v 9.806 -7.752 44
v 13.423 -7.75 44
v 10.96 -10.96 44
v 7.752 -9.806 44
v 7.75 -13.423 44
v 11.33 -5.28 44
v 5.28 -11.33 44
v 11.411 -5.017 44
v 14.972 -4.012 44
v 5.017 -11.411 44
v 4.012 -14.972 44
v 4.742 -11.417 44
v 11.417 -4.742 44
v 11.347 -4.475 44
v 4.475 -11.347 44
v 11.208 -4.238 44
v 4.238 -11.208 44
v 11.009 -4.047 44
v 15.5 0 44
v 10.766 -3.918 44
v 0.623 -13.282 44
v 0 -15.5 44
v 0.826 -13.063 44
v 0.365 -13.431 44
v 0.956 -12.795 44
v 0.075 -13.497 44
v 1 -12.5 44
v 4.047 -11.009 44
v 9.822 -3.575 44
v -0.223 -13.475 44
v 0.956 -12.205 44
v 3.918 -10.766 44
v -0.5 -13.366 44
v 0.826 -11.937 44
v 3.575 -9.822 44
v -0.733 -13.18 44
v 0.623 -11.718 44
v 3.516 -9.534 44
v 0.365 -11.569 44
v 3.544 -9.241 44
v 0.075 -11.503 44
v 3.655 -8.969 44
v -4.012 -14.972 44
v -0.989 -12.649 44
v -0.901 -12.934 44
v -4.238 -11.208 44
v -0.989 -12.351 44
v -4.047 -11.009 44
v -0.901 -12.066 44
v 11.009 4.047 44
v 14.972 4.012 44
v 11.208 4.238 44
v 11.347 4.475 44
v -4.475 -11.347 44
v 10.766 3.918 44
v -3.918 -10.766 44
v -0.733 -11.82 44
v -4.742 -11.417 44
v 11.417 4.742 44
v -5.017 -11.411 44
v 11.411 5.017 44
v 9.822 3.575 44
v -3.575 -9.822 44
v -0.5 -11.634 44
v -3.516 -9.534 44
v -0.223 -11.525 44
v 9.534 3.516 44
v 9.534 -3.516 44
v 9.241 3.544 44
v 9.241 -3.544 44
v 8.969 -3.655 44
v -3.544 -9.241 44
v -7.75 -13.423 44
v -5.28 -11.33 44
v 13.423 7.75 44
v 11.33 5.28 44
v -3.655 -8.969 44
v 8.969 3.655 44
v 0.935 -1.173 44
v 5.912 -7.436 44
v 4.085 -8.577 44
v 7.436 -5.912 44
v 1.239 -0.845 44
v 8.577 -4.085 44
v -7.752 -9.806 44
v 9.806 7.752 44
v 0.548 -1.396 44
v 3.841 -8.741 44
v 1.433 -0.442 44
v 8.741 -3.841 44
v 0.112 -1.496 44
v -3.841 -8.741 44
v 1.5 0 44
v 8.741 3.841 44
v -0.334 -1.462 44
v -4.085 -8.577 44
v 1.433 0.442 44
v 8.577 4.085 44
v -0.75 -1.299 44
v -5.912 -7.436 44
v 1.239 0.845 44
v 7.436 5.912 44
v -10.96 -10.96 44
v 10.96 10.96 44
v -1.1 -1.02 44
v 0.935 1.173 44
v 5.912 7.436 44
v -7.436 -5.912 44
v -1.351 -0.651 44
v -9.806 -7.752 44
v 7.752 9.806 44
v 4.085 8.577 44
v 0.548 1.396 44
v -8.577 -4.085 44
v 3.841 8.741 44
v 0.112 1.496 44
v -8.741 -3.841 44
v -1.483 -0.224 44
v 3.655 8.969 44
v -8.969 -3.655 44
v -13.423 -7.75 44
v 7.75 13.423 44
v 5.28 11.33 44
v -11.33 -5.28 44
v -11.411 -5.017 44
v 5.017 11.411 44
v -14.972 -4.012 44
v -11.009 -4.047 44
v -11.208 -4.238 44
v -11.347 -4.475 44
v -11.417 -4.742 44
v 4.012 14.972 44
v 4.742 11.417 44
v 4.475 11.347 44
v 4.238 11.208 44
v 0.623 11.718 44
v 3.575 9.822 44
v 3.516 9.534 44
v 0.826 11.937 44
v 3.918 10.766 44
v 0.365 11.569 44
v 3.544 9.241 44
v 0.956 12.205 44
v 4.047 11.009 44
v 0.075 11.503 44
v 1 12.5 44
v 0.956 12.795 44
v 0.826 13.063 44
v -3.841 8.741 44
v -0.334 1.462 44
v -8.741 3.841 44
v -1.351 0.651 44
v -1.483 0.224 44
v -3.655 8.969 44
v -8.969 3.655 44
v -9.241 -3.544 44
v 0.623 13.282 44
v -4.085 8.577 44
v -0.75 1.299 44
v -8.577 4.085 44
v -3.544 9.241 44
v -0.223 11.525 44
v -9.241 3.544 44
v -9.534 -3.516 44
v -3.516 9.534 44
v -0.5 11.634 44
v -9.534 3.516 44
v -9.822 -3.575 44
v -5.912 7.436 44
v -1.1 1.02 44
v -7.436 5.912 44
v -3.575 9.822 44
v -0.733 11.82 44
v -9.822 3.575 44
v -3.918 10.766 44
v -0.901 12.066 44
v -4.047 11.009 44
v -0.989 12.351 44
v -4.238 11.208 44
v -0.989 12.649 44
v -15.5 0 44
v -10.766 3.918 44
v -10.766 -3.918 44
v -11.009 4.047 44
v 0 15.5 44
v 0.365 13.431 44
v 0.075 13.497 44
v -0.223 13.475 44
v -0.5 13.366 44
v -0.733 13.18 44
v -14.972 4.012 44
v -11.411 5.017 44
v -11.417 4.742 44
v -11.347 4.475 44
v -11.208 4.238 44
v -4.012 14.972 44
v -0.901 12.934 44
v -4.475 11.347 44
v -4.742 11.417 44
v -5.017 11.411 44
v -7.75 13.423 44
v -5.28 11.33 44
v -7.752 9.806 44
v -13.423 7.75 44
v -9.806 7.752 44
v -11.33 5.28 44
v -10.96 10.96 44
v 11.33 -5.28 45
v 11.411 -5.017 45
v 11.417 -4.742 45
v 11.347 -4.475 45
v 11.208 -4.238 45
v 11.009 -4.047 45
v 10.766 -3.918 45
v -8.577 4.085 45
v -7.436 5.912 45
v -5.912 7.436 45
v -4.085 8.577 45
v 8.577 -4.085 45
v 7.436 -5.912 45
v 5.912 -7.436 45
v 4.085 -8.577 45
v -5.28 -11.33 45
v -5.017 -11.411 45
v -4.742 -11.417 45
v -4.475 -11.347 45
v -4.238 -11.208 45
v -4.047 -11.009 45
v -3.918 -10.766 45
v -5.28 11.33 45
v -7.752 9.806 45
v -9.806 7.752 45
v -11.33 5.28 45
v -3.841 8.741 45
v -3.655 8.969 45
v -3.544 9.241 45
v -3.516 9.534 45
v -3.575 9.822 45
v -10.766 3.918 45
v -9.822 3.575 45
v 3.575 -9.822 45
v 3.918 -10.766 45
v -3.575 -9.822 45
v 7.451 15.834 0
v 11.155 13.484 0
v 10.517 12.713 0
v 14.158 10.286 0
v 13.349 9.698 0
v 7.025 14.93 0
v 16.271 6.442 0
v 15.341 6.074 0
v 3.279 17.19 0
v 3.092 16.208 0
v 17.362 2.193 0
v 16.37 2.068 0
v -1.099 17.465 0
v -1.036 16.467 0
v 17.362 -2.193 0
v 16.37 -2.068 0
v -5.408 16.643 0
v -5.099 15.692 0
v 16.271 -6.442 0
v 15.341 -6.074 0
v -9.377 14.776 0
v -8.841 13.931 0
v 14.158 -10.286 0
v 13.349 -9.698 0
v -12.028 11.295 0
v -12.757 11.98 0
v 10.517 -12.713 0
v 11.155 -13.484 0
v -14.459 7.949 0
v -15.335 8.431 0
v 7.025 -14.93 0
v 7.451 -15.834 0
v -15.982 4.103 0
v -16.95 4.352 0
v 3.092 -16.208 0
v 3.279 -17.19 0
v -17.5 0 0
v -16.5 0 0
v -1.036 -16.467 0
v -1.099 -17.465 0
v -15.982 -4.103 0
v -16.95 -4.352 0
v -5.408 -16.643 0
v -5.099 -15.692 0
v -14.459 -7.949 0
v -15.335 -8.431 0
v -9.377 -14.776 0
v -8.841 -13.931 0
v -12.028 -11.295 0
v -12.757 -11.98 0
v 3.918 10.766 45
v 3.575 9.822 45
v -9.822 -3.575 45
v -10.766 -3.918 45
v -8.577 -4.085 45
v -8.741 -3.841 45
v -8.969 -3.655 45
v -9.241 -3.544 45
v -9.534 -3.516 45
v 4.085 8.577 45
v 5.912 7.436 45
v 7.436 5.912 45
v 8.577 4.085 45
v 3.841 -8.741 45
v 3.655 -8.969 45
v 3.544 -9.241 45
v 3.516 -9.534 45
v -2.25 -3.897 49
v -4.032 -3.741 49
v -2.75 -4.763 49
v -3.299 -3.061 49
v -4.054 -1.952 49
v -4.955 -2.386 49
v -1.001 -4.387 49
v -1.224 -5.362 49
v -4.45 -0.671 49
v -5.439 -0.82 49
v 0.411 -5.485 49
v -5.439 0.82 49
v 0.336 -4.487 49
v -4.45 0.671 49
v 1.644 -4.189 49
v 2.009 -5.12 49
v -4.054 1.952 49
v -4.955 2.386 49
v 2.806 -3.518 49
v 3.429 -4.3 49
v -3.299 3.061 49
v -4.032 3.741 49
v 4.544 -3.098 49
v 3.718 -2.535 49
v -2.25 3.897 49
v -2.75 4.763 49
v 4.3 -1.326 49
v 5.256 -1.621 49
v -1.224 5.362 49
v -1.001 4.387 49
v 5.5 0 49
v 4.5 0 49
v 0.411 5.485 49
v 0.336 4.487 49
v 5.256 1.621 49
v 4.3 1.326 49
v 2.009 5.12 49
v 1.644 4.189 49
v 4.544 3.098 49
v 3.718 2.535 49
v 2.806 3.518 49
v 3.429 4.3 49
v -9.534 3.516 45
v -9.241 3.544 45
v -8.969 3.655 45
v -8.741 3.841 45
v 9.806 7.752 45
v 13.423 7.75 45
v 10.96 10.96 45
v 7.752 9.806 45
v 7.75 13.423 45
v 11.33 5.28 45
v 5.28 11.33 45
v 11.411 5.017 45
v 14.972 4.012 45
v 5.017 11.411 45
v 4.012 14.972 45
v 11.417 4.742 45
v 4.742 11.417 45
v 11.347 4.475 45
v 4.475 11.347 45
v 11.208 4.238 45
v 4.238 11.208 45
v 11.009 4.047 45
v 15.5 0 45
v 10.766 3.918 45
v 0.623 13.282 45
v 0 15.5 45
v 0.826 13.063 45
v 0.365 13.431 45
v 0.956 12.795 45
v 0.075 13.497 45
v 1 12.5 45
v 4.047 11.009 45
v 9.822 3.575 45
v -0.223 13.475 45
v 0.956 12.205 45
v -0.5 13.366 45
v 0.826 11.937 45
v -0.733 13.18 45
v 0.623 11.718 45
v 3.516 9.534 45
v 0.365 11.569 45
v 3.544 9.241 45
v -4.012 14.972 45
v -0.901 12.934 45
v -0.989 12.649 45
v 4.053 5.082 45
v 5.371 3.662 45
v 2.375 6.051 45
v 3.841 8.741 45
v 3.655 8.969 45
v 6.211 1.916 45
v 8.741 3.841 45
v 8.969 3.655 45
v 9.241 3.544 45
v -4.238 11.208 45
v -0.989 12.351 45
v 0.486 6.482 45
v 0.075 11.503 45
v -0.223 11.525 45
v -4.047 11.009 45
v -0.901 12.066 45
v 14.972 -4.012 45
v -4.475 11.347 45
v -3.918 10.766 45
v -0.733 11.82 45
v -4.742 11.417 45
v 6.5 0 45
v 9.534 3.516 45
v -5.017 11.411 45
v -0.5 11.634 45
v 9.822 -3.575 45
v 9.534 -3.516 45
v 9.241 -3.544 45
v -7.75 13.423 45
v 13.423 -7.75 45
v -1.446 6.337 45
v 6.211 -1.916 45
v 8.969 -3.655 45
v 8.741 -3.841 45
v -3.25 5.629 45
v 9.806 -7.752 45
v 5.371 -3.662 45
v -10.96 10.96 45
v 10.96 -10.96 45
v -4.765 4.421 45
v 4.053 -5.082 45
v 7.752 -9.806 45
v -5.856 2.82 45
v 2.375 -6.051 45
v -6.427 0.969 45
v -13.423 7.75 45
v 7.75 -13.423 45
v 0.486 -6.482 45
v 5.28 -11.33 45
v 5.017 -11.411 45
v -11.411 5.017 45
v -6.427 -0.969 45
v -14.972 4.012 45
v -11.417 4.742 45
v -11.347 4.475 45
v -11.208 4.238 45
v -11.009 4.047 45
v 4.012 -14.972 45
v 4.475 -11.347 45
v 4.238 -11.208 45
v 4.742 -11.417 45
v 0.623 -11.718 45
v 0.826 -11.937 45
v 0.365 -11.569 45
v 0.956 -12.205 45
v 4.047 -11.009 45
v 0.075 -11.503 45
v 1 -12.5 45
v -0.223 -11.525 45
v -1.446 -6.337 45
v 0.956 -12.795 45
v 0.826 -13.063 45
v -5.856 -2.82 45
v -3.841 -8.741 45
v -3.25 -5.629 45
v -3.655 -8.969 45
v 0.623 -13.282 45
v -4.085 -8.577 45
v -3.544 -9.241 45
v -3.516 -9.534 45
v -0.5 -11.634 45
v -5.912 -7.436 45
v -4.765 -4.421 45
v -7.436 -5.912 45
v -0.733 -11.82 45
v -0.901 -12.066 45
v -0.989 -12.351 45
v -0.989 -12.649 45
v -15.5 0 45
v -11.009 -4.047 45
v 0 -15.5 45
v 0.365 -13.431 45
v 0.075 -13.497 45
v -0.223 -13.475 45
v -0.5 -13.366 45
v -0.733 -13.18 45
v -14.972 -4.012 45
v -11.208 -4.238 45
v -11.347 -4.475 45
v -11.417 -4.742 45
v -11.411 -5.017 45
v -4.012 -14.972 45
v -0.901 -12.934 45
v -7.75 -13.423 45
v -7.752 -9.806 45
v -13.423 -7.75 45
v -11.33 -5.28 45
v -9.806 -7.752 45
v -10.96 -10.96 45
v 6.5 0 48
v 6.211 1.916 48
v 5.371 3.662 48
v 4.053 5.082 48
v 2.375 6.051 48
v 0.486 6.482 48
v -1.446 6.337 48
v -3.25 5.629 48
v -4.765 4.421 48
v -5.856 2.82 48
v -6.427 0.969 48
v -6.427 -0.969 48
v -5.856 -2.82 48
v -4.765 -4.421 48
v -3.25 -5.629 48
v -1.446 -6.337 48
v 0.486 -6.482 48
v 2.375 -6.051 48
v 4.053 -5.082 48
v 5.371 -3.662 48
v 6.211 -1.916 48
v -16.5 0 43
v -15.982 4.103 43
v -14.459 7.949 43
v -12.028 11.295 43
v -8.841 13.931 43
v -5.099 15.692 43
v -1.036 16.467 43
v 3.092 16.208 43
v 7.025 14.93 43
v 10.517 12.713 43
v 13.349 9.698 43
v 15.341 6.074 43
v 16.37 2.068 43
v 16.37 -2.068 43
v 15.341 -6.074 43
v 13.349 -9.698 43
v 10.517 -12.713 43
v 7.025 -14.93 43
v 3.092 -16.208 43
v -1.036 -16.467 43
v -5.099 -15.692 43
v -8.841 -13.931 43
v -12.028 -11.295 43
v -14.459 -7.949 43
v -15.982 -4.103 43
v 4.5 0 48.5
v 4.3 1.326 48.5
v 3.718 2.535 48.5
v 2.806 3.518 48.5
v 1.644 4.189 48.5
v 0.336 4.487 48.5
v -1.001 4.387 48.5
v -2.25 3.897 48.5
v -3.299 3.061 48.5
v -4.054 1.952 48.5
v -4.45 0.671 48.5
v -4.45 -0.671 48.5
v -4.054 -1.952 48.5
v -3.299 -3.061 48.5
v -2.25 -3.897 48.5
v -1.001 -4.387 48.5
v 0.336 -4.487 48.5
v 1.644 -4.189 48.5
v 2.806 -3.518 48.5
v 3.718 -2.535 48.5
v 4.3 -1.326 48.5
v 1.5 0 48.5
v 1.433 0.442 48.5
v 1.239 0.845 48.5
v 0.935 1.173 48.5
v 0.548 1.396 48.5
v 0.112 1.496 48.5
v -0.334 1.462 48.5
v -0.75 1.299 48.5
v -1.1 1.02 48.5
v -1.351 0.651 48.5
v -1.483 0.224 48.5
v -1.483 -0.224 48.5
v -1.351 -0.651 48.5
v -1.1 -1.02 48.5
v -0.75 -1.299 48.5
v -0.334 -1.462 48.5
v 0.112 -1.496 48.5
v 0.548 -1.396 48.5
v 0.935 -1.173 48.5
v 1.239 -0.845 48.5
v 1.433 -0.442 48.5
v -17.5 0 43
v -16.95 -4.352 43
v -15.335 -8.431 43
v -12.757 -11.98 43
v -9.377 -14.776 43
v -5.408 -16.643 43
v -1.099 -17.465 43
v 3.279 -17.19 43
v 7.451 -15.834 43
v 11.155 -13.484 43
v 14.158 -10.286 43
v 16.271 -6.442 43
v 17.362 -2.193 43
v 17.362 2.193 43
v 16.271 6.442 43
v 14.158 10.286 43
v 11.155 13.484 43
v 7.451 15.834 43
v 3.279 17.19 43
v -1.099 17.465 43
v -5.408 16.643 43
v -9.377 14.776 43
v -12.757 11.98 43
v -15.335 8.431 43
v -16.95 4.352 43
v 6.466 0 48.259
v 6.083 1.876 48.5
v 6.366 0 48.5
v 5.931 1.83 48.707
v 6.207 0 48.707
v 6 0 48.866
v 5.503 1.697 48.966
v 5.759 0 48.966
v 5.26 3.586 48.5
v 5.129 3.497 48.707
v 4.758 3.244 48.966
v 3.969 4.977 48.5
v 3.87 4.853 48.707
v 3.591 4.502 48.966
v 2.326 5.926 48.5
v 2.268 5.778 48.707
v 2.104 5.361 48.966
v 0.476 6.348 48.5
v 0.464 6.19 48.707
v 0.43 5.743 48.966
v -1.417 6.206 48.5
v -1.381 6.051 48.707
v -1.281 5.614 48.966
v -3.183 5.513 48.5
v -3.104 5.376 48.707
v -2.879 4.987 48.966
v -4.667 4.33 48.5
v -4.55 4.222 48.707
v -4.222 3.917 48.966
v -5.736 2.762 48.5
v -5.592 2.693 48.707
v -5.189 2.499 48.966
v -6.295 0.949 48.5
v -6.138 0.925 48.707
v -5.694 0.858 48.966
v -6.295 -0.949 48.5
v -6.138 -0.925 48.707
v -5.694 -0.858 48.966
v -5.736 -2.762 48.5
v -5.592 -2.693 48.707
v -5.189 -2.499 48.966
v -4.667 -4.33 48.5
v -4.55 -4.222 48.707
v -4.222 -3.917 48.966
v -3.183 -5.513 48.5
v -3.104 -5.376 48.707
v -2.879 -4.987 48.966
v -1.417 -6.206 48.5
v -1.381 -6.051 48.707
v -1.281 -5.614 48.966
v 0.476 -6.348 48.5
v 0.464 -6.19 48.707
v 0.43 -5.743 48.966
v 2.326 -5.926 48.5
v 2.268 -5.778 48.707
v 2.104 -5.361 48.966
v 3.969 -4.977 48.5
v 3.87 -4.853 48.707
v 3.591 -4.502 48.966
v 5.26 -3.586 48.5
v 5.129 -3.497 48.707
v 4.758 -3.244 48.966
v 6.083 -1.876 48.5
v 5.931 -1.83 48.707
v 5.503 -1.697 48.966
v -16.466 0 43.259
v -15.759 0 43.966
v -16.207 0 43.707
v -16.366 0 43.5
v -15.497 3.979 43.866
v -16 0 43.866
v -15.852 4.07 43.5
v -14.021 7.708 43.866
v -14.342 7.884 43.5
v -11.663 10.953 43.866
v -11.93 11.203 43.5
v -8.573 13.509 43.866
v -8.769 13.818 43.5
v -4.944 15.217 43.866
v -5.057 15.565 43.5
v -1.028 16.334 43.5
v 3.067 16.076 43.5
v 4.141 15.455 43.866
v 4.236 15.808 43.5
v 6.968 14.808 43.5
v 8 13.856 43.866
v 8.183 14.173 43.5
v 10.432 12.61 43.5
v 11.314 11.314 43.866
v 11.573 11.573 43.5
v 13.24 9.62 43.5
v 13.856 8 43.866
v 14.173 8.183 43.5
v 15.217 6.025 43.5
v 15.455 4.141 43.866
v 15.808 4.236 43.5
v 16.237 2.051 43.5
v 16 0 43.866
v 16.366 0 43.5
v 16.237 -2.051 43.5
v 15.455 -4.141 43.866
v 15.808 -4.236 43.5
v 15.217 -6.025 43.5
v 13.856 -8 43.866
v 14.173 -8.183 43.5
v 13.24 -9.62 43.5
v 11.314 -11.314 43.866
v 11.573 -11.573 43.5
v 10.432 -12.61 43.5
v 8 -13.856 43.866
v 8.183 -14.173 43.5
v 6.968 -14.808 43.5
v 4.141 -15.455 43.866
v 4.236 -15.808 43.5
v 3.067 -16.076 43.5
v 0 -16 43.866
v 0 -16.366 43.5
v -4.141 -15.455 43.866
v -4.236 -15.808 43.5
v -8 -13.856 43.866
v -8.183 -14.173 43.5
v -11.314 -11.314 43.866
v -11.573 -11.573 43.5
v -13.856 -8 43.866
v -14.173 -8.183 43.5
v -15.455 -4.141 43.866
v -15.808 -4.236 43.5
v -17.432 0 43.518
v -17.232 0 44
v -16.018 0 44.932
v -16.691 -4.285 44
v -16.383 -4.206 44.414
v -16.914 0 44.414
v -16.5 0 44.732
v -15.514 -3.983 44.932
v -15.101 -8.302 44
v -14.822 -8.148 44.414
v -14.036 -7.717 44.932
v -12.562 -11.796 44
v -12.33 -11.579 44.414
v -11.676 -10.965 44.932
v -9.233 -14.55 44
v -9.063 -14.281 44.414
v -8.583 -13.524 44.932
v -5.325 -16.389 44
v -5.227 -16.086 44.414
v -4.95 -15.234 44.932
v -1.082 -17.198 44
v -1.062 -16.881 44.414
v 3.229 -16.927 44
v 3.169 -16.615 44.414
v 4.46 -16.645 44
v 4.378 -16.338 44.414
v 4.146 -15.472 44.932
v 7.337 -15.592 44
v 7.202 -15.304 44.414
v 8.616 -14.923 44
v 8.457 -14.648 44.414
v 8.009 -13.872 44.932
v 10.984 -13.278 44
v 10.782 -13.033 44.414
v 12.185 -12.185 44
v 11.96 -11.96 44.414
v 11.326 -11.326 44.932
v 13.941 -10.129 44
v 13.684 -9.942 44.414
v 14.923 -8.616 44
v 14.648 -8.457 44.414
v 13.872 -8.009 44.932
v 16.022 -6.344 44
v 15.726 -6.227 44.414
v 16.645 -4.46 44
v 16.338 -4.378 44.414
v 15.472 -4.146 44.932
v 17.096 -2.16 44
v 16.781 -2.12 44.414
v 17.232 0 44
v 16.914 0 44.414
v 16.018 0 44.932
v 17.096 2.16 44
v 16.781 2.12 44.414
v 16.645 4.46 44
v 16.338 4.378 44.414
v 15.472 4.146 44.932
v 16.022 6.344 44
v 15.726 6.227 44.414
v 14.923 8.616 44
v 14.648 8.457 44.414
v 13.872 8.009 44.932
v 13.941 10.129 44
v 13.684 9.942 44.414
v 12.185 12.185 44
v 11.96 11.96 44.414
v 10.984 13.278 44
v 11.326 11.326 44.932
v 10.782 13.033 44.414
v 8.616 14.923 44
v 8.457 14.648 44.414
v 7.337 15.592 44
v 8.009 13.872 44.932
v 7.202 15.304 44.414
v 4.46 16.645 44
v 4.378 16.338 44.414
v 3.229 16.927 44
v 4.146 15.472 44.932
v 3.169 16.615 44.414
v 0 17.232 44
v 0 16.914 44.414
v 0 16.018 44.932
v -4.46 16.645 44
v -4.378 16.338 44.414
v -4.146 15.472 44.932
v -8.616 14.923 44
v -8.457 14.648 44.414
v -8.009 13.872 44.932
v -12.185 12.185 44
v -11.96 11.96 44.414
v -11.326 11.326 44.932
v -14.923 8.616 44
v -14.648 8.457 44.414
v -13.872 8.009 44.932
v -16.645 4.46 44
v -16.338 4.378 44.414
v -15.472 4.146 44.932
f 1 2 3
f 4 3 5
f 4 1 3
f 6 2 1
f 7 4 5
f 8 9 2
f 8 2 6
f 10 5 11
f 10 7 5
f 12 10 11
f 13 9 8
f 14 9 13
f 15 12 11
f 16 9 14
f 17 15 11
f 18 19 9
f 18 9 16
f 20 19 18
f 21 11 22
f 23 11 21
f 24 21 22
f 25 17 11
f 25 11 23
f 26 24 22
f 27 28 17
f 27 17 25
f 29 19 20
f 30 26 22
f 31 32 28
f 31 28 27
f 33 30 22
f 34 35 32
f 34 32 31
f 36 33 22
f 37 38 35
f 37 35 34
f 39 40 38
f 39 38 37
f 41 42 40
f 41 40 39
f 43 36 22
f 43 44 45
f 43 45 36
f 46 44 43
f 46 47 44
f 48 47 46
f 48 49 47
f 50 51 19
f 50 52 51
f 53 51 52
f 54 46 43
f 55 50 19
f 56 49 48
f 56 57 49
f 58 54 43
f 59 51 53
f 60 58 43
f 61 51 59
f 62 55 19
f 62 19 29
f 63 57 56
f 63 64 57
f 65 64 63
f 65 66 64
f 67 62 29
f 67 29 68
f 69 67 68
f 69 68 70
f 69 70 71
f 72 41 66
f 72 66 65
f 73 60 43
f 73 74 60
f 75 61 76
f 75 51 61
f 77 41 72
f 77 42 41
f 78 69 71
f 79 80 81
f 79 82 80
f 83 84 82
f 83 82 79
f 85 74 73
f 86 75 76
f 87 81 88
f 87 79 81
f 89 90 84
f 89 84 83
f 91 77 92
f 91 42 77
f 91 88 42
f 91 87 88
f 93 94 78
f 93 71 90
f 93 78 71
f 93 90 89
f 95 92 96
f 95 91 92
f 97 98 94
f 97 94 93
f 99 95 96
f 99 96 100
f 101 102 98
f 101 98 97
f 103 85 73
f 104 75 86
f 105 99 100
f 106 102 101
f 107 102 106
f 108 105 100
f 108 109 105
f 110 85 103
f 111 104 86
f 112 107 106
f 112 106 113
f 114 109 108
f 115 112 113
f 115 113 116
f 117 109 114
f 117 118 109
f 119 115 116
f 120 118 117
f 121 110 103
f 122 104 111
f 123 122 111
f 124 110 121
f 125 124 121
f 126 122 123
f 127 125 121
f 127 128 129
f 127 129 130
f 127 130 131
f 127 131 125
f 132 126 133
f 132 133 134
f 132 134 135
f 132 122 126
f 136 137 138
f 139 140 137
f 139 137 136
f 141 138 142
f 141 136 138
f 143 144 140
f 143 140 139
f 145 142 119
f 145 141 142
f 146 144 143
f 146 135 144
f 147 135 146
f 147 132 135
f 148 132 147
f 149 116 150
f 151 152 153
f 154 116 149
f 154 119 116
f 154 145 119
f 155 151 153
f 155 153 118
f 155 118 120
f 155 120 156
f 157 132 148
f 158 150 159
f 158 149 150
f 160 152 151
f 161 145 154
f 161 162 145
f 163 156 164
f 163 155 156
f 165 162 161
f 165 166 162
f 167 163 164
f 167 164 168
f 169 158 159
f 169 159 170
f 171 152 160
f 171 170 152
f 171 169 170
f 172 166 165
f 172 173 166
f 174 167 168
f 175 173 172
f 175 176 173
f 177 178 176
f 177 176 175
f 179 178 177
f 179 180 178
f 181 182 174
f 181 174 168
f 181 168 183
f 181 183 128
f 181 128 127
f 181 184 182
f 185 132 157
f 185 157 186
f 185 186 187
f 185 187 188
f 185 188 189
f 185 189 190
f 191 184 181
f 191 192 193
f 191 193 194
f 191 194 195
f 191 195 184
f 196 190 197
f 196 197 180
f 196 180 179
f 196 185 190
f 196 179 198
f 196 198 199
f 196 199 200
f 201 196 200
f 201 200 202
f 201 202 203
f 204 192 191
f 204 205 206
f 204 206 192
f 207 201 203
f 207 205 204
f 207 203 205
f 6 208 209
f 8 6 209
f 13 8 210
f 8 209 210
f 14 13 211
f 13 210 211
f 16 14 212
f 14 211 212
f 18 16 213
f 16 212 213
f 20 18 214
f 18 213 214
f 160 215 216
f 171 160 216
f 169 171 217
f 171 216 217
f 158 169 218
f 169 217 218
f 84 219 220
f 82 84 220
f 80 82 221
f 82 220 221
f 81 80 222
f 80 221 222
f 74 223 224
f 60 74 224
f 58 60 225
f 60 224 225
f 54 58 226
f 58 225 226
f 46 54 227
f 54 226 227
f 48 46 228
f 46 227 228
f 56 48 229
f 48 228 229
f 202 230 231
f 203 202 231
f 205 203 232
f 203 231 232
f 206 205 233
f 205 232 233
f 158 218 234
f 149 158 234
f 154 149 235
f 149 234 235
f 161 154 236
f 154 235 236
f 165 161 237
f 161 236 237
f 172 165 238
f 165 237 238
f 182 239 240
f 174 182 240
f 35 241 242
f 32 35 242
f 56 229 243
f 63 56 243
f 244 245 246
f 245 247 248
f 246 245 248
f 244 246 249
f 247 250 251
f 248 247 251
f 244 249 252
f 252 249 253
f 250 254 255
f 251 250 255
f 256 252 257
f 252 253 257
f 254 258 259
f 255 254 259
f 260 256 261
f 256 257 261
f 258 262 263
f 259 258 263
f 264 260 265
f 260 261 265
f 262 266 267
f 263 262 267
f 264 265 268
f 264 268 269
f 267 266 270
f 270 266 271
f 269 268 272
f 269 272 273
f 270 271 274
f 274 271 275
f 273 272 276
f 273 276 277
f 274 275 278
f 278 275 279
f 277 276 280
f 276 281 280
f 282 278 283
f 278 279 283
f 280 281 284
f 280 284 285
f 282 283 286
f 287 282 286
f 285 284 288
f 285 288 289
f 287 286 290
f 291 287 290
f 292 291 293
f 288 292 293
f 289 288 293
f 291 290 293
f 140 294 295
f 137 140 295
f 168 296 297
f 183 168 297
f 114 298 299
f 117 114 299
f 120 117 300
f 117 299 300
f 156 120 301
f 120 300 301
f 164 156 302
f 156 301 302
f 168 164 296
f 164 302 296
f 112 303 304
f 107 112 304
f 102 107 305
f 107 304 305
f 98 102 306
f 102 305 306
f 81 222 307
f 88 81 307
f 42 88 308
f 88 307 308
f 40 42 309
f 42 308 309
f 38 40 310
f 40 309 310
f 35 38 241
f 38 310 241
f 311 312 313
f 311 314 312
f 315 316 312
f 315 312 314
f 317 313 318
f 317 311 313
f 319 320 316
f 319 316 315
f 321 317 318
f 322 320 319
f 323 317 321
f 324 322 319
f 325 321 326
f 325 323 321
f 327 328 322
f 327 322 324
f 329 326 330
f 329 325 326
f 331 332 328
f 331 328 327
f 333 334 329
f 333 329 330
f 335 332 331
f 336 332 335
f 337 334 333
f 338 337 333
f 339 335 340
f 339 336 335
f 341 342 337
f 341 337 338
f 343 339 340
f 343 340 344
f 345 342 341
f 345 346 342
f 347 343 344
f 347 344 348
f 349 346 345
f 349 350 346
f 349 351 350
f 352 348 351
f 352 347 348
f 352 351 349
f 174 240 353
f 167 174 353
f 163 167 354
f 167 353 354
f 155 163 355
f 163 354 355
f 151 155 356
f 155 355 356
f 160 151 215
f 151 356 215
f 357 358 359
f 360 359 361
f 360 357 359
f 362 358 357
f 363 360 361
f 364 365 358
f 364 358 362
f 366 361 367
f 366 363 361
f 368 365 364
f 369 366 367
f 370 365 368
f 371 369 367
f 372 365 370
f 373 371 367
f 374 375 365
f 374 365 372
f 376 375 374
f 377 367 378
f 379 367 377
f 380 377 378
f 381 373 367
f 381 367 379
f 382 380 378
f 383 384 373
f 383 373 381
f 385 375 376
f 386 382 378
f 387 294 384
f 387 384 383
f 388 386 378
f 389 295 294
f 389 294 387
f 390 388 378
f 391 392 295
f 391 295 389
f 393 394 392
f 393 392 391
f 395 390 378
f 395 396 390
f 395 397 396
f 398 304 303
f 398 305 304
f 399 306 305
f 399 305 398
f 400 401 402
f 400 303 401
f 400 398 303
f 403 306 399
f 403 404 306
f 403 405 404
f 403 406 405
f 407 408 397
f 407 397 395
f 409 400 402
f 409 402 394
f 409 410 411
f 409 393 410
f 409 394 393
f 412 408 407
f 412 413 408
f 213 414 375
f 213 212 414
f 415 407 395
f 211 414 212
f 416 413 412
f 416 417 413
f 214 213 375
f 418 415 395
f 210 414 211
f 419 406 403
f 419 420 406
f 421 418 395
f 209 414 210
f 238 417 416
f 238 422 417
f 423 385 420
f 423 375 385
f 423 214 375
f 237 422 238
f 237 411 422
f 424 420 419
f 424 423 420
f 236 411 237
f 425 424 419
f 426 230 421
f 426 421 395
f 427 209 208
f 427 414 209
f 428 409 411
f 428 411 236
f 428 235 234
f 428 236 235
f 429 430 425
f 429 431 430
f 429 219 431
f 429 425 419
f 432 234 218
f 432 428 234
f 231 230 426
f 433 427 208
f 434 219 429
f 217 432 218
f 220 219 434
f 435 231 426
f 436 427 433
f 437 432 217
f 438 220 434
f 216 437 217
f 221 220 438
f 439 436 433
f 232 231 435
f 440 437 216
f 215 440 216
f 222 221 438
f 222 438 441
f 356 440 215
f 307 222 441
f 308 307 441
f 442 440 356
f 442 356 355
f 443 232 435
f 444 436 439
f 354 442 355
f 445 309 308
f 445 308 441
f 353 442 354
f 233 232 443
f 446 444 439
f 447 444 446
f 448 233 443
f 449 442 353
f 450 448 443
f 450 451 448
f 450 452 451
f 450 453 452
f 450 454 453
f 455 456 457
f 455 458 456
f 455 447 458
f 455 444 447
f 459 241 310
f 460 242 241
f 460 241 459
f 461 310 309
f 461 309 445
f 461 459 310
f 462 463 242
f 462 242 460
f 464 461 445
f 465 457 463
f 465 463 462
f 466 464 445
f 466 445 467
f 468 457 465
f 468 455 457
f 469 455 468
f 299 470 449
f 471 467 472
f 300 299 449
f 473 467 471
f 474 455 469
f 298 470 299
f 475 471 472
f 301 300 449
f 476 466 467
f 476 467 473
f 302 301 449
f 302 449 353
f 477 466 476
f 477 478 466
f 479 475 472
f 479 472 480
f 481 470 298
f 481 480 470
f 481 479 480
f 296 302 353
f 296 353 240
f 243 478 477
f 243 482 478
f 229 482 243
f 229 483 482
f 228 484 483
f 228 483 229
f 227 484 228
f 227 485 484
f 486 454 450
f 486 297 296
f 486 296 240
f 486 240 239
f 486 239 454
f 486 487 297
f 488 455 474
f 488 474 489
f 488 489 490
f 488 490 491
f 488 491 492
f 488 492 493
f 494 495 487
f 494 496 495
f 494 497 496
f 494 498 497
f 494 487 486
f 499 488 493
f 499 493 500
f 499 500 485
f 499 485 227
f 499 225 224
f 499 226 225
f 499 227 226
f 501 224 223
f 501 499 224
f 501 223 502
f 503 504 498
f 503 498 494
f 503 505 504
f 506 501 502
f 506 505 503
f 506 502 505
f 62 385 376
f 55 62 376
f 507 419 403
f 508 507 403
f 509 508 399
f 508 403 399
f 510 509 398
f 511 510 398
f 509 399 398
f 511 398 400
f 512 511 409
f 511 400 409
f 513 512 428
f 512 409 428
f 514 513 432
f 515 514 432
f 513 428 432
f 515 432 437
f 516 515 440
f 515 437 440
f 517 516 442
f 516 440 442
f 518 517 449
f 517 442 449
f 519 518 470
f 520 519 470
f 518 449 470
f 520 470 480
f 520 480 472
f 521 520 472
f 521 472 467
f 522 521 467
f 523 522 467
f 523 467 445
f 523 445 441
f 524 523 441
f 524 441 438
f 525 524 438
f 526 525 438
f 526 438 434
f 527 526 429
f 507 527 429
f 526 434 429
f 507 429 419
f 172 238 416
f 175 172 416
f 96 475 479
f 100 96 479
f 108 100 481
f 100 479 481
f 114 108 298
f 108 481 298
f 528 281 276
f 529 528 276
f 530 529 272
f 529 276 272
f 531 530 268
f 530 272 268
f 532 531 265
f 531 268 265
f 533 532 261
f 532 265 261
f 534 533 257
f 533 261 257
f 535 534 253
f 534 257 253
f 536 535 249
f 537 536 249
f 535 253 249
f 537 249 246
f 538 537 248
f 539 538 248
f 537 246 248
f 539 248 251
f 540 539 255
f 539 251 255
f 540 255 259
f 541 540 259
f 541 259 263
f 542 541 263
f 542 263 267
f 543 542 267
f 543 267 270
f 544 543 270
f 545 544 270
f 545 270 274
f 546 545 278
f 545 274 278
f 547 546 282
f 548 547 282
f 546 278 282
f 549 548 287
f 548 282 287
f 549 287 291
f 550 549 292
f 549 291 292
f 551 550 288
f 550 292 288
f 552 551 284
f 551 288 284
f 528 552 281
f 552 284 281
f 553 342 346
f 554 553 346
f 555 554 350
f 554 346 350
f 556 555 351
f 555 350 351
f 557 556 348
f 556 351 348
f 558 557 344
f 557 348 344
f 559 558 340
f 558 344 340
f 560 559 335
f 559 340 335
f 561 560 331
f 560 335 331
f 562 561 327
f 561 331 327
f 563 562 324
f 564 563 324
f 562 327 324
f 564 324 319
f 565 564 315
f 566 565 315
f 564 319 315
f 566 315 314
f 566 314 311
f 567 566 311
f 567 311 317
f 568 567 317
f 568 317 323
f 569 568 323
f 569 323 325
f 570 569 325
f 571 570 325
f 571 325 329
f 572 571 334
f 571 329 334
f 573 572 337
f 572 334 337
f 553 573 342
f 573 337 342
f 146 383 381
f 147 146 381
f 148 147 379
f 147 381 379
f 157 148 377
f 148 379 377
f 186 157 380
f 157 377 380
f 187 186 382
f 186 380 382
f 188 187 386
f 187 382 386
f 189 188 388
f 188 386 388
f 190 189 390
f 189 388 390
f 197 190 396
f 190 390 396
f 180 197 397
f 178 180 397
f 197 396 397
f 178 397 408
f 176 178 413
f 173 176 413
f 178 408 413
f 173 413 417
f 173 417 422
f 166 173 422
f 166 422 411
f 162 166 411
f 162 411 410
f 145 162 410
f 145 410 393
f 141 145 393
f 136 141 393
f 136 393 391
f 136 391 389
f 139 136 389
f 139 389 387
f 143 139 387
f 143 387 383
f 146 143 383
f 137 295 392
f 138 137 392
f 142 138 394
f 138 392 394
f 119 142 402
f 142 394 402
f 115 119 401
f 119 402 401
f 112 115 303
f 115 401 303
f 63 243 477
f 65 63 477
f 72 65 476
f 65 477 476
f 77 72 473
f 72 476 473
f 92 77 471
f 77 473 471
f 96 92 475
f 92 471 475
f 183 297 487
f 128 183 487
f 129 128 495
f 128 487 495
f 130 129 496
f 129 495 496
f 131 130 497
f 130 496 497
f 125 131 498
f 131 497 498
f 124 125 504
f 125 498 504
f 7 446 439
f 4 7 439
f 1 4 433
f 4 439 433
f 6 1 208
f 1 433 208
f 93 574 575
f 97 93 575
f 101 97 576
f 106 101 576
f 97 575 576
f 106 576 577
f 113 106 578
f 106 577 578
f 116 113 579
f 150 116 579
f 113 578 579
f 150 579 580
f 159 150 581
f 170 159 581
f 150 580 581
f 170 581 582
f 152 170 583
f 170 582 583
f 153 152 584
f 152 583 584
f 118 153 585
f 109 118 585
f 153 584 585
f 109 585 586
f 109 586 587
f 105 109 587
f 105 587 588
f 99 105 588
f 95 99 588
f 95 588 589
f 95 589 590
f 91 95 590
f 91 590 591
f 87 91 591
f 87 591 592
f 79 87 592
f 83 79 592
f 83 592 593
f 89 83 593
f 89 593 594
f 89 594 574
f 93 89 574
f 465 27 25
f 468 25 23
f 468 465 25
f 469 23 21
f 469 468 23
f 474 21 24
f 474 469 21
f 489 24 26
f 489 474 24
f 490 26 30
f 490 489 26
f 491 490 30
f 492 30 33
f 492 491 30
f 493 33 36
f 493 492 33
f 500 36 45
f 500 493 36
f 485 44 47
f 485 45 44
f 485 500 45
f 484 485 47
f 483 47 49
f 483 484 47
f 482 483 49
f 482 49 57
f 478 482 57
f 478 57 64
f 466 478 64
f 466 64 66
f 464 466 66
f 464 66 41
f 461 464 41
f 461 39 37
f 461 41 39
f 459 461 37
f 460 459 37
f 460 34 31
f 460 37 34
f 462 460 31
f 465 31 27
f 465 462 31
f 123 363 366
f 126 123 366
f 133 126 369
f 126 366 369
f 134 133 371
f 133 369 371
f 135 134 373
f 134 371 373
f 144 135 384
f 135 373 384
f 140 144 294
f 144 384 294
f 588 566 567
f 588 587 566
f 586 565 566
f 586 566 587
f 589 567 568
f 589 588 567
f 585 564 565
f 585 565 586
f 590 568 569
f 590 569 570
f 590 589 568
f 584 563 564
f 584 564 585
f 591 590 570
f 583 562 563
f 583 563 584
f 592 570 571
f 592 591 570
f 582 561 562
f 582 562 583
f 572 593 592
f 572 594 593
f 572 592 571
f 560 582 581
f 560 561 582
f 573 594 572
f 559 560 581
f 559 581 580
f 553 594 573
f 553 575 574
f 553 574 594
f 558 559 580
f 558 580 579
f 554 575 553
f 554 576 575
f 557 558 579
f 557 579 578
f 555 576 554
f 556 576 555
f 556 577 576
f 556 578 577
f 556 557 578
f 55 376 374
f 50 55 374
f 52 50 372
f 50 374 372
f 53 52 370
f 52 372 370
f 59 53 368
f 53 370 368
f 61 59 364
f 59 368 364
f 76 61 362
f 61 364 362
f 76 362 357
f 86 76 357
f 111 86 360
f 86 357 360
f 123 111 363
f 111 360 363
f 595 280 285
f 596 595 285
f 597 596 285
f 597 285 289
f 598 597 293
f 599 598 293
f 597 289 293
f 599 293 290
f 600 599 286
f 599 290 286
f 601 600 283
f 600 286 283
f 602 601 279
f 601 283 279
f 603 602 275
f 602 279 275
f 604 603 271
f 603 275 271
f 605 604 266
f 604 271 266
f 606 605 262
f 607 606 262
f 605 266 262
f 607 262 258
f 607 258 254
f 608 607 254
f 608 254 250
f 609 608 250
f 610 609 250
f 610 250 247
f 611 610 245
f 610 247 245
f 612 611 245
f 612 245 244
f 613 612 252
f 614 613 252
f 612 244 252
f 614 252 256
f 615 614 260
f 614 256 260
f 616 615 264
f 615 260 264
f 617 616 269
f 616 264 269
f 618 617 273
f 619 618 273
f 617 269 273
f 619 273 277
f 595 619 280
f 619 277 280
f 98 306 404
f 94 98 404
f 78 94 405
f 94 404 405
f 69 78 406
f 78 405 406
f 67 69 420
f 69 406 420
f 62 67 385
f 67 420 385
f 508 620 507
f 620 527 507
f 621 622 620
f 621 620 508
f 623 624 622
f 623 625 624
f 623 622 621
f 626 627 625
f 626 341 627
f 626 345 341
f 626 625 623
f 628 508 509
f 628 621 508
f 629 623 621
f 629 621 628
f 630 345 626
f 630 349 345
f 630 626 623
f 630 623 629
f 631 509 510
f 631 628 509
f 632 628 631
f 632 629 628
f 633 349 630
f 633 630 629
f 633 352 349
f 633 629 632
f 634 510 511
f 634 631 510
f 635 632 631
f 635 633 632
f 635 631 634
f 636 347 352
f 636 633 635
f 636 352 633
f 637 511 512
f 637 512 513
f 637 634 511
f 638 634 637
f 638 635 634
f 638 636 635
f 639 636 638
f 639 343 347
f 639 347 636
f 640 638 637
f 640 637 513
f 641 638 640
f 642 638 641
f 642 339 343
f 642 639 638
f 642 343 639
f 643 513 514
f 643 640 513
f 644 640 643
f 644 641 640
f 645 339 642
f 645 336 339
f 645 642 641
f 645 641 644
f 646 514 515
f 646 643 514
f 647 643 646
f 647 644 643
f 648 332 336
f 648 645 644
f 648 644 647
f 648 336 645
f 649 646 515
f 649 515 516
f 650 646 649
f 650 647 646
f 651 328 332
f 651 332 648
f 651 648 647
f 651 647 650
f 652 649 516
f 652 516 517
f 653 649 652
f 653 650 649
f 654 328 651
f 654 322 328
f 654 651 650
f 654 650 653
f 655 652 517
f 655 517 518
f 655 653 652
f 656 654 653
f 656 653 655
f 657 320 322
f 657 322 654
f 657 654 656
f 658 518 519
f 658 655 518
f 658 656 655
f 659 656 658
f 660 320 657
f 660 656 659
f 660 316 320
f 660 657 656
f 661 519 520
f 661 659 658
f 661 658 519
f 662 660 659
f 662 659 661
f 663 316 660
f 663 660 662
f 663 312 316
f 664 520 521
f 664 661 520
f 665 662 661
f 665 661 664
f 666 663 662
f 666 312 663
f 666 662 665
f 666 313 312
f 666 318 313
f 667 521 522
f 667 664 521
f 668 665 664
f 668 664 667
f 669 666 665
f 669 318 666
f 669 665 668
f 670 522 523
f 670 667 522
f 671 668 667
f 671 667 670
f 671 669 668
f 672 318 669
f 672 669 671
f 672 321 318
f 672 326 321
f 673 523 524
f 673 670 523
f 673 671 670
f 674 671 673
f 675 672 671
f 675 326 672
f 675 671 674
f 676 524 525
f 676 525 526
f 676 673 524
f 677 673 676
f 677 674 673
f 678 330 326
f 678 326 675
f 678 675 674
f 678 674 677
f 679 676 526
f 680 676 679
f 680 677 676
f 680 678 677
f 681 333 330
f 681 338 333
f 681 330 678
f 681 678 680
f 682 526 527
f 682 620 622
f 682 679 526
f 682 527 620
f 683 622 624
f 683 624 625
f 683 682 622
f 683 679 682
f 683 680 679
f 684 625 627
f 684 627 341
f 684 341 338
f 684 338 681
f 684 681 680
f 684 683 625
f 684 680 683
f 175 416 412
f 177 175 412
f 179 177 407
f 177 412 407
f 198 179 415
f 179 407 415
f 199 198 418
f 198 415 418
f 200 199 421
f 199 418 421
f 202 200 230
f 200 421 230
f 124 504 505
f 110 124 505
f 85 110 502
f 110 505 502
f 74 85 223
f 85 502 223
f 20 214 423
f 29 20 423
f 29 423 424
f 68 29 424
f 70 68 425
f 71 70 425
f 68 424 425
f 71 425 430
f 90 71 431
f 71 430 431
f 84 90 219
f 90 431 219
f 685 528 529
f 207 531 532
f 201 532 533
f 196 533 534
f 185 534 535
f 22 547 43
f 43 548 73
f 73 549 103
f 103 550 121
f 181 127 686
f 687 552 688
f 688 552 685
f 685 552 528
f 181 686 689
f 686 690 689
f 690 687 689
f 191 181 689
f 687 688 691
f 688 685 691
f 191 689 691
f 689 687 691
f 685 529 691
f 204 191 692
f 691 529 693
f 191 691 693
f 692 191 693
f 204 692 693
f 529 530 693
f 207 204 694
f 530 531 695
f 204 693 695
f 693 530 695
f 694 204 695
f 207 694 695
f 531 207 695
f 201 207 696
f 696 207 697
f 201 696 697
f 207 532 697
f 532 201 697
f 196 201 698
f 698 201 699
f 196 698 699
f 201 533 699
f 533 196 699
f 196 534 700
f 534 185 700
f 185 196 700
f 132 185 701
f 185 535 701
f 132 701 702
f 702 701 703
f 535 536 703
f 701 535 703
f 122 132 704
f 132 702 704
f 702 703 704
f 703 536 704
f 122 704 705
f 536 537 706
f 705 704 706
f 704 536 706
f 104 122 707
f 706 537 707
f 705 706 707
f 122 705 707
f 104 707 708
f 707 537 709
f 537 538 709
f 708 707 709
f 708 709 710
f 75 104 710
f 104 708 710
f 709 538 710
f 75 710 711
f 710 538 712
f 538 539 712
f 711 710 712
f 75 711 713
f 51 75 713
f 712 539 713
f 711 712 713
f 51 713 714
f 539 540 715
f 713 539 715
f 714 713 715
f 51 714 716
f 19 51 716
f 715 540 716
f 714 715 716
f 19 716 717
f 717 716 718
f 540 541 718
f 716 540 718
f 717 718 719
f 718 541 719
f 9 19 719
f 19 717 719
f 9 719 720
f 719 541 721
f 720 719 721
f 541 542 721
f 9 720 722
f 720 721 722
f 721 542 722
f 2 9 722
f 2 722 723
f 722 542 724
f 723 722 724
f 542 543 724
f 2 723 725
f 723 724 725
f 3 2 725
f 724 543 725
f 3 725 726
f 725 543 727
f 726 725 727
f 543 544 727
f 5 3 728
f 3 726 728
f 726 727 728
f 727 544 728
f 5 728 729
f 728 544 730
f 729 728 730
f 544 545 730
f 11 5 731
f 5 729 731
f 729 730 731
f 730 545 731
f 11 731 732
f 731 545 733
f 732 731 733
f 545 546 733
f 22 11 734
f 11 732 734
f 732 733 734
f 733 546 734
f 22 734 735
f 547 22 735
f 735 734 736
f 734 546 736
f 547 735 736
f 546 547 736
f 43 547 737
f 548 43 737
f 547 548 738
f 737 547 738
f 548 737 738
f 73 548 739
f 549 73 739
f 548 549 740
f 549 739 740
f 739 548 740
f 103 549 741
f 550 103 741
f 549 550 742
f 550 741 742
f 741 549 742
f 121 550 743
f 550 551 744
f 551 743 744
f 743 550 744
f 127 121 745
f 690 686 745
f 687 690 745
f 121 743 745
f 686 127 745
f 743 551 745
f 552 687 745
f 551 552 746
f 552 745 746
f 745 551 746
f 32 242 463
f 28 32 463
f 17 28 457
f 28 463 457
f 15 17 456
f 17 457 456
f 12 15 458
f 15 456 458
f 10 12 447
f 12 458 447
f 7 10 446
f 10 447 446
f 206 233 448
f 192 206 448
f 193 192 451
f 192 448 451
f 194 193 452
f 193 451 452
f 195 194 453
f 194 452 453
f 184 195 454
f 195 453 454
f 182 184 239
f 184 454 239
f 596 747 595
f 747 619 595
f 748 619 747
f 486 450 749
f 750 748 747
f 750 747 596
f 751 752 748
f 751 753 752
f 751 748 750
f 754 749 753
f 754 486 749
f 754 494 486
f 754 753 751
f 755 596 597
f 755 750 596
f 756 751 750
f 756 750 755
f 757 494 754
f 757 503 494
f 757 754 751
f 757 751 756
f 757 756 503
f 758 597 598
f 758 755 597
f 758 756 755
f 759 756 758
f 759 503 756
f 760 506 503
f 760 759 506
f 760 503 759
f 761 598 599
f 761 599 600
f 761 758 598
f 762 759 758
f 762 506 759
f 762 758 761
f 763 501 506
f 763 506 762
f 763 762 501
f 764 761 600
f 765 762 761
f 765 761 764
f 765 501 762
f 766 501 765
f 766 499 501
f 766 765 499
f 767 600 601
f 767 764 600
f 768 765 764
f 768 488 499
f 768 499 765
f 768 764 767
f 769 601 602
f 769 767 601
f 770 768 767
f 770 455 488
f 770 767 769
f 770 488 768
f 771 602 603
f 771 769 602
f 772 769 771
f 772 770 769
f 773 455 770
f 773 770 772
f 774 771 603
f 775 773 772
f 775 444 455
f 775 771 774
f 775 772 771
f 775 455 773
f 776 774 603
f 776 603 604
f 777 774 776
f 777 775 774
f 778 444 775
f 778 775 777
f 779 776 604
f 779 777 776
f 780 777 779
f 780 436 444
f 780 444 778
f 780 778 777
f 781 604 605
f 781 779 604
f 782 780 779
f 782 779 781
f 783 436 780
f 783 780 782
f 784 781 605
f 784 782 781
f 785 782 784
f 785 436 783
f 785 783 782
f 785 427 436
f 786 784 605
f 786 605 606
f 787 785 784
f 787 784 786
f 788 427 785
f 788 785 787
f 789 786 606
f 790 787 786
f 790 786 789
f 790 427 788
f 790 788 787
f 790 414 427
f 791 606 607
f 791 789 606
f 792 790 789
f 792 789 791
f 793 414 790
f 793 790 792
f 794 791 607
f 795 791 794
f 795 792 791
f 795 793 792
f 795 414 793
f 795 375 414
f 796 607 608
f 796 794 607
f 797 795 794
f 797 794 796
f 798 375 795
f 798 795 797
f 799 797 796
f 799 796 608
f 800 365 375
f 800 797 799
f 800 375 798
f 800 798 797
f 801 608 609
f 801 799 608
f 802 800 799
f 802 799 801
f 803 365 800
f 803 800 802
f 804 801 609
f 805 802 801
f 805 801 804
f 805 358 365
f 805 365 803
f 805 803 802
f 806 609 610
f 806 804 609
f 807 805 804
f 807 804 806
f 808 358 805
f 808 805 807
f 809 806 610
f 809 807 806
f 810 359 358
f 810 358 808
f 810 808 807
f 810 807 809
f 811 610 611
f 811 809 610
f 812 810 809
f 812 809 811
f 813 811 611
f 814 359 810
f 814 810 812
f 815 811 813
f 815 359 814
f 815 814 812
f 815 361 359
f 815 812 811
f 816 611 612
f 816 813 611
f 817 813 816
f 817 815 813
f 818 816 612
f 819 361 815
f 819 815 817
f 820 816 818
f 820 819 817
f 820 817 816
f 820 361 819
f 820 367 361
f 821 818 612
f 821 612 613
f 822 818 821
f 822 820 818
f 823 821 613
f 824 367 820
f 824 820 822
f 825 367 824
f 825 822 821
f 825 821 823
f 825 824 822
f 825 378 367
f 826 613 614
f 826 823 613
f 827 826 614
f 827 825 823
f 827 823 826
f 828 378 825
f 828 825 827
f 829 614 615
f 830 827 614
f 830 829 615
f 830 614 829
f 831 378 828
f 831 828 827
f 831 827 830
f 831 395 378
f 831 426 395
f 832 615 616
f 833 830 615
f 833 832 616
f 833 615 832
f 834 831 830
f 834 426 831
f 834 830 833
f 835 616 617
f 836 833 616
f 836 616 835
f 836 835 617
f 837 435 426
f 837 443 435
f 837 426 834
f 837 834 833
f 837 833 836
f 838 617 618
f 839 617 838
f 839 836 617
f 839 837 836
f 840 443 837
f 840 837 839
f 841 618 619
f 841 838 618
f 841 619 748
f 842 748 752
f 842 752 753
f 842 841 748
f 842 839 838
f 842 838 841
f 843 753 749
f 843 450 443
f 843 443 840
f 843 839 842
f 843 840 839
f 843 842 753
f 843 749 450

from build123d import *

# Parameters (mm, degrees)
IZIM2_R                     = 17.5
Y_KSEKLIK_EKSTR_ZYON1_DEPTH = 45
IZIM3_R                     = 6.5
Y_KSEKLIK_EKSTR_ZYON2_DEPTH = 4
RADYUS1_R                   = 2
RADYUS2_R                   = 1
IZIM4_R                     = 1
KES_EKSTR_ZYON1_DEPTH       = 45
IZIM5_R                     = 16.5
KES_EKSTR_ZYON2_DEPTH       = 44
RADYUS3_R                   = 1
KES_EKSTR_ZYON3_DEPTH       = 44
DAIRESEL_KAPLAMA1_COUNT     = 4
IZIM9_R                     = 4.5
KES_EKSTR_ZYON4_DEPTH       = 0.5
IZIM10_R                    = 1.5
KES_EKSTR_ZYON6_DEPTH       = 30


with BuildPart() as part:
    # Çizim2 → Yükseklik-Ekstrüzyon1 (new body)
    with BuildSketch(Plane.XY):
        with Locations(Location((0, 0, 0), (0, 0, 180))):
            Circle(IZIM2_R)
    extrude(amount=Y_KSEKLIK_EKSTR_ZYON1_DEPTH)

    # Çizim3 → Yükseklik-Ekstrüzyon2 (add)
    with BuildSketch(Plane.XY.offset(45)):
        Circle(IZIM3_R)
    extrude(amount=Y_KSEKLIK_EKSTR_ZYON2_DEPTH)

    # Radyus1
    radyus1_edges = [part.edges().sort_by_distance(p)[0] for p in [
        (17.5, 0, 45),
    ]]
    fillet(radyus1_edges, radius=RADYUS1_R)

    # Radyus2
    radyus2_edges = [part.edges().sort_by_distance(p)[0] for p in [
        (-6.5, 0, 49),
    ]]
    fillet(radyus2_edges, radius=RADYUS2_R)

    # Çizim4 → Kes-Ekstrüzyon1 (cut)
    with BuildSketch(Plane.XY.offset(45)):
        with Locations((0, 12.5)):
            Circle(IZIM4_R)
    kes_ekstr_zyon1 = extrude(amount=-KES_EKSTR_ZYON1_DEPTH, mode=Mode.SUBTRACT)

    # Çizim5 → Kes-Ekstrüzyon2 (cut)
    with BuildSketch(Plane(origin=(0, 0, 0), x_dir=(-1, 0, 0), z_dir=(0, 0, -1))):
        Circle(IZIM5_R)
    extrude(amount=-KES_EKSTR_ZYON2_DEPTH, mode=Mode.SUBTRACT)

    # Radyus3
    radyus3_edges = [part.edges().sort_by_distance(p)[0] for p in [
        (16.5, 0, 44),
    ]]
    fillet(radyus3_edges, radius=RADYUS3_R)

    # Aynalama1: Kes-Ekstrüzyon1 across plane
    add(kes_ekstr_zyon1.mirror(Plane.ZX), mode=Mode.SUBTRACT)

    # Çizim7 → Kes-Ekstrüzyon3 (cut)
    with BuildSketch(Plane.XY.offset(45)):
        with BuildLine():
            ThreePointArc((8.577055255, 4.084620319), (9.100972079, 3.589155465), (9.82192332, 3.574887732))
            Line((9.82192332, 3.574887732), (10.765531412, 3.91833299))
            ThreePointArc((10.765531412, 3.91833299), (11.347352532, 4.475249801), (11.329903553, 5.28046262))
            ThreePointArc((11.329903553, 5.28046262), (8.838834765, 8.838834765), (5.28046262, 11.329903553))
            ThreePointArc((5.28046262, 11.329903553), (4.475249801, 11.347352532), (3.91833299, 10.765531412))
            Line((3.91833299, 10.765531412), (3.574887732, 9.82192332))
            ThreePointArc((3.574887732, 9.82192332), (3.589155465, 9.100972079), (4.084620319, 8.577055255))
            ThreePointArc((4.084620319, 8.577055255), (6.717514421, 6.717514421), (8.577055255, 4.084620319))
        make_face()
    kes_ekstr_zyon3 = extrude(amount=-KES_EKSTR_ZYON3_DEPTH, mode=Mode.SUBTRACT)

    # Dairesel Kaplama1: Kes-Ekstrüzyon3 ×4 about axis
    dairesel_kaplama1_axis = Axis((0, 0, 0), (0, 0, 1))
    for i in range(1, DAIRESEL_KAPLAMA1_COUNT):
        add(kes_ekstr_zyon3.rotate(dairesel_kaplama1_axis, i * 360 / DAIRESEL_KAPLAMA1_COUNT), mode=Mode.SUBTRACT)

    # Çizim9 → Kes-Ekstrüzyon4 (cut)
    with BuildSketch(Plane.XY.offset(49)):
        Circle(IZIM9_R)
    extrude(amount=-KES_EKSTR_ZYON4_DEPTH, mode=Mode.SUBTRACT)

    # Çizim10 → Kes-Ekstrüzyon6 (cut)
    with BuildSketch(Plane.XY.offset(48.5)):
        Circle(IZIM10_R)
    extrude(amount=-KES_EKSTR_ZYON6_DEPTH, mode=Mode.SUBTRACT)


solid = part.part
